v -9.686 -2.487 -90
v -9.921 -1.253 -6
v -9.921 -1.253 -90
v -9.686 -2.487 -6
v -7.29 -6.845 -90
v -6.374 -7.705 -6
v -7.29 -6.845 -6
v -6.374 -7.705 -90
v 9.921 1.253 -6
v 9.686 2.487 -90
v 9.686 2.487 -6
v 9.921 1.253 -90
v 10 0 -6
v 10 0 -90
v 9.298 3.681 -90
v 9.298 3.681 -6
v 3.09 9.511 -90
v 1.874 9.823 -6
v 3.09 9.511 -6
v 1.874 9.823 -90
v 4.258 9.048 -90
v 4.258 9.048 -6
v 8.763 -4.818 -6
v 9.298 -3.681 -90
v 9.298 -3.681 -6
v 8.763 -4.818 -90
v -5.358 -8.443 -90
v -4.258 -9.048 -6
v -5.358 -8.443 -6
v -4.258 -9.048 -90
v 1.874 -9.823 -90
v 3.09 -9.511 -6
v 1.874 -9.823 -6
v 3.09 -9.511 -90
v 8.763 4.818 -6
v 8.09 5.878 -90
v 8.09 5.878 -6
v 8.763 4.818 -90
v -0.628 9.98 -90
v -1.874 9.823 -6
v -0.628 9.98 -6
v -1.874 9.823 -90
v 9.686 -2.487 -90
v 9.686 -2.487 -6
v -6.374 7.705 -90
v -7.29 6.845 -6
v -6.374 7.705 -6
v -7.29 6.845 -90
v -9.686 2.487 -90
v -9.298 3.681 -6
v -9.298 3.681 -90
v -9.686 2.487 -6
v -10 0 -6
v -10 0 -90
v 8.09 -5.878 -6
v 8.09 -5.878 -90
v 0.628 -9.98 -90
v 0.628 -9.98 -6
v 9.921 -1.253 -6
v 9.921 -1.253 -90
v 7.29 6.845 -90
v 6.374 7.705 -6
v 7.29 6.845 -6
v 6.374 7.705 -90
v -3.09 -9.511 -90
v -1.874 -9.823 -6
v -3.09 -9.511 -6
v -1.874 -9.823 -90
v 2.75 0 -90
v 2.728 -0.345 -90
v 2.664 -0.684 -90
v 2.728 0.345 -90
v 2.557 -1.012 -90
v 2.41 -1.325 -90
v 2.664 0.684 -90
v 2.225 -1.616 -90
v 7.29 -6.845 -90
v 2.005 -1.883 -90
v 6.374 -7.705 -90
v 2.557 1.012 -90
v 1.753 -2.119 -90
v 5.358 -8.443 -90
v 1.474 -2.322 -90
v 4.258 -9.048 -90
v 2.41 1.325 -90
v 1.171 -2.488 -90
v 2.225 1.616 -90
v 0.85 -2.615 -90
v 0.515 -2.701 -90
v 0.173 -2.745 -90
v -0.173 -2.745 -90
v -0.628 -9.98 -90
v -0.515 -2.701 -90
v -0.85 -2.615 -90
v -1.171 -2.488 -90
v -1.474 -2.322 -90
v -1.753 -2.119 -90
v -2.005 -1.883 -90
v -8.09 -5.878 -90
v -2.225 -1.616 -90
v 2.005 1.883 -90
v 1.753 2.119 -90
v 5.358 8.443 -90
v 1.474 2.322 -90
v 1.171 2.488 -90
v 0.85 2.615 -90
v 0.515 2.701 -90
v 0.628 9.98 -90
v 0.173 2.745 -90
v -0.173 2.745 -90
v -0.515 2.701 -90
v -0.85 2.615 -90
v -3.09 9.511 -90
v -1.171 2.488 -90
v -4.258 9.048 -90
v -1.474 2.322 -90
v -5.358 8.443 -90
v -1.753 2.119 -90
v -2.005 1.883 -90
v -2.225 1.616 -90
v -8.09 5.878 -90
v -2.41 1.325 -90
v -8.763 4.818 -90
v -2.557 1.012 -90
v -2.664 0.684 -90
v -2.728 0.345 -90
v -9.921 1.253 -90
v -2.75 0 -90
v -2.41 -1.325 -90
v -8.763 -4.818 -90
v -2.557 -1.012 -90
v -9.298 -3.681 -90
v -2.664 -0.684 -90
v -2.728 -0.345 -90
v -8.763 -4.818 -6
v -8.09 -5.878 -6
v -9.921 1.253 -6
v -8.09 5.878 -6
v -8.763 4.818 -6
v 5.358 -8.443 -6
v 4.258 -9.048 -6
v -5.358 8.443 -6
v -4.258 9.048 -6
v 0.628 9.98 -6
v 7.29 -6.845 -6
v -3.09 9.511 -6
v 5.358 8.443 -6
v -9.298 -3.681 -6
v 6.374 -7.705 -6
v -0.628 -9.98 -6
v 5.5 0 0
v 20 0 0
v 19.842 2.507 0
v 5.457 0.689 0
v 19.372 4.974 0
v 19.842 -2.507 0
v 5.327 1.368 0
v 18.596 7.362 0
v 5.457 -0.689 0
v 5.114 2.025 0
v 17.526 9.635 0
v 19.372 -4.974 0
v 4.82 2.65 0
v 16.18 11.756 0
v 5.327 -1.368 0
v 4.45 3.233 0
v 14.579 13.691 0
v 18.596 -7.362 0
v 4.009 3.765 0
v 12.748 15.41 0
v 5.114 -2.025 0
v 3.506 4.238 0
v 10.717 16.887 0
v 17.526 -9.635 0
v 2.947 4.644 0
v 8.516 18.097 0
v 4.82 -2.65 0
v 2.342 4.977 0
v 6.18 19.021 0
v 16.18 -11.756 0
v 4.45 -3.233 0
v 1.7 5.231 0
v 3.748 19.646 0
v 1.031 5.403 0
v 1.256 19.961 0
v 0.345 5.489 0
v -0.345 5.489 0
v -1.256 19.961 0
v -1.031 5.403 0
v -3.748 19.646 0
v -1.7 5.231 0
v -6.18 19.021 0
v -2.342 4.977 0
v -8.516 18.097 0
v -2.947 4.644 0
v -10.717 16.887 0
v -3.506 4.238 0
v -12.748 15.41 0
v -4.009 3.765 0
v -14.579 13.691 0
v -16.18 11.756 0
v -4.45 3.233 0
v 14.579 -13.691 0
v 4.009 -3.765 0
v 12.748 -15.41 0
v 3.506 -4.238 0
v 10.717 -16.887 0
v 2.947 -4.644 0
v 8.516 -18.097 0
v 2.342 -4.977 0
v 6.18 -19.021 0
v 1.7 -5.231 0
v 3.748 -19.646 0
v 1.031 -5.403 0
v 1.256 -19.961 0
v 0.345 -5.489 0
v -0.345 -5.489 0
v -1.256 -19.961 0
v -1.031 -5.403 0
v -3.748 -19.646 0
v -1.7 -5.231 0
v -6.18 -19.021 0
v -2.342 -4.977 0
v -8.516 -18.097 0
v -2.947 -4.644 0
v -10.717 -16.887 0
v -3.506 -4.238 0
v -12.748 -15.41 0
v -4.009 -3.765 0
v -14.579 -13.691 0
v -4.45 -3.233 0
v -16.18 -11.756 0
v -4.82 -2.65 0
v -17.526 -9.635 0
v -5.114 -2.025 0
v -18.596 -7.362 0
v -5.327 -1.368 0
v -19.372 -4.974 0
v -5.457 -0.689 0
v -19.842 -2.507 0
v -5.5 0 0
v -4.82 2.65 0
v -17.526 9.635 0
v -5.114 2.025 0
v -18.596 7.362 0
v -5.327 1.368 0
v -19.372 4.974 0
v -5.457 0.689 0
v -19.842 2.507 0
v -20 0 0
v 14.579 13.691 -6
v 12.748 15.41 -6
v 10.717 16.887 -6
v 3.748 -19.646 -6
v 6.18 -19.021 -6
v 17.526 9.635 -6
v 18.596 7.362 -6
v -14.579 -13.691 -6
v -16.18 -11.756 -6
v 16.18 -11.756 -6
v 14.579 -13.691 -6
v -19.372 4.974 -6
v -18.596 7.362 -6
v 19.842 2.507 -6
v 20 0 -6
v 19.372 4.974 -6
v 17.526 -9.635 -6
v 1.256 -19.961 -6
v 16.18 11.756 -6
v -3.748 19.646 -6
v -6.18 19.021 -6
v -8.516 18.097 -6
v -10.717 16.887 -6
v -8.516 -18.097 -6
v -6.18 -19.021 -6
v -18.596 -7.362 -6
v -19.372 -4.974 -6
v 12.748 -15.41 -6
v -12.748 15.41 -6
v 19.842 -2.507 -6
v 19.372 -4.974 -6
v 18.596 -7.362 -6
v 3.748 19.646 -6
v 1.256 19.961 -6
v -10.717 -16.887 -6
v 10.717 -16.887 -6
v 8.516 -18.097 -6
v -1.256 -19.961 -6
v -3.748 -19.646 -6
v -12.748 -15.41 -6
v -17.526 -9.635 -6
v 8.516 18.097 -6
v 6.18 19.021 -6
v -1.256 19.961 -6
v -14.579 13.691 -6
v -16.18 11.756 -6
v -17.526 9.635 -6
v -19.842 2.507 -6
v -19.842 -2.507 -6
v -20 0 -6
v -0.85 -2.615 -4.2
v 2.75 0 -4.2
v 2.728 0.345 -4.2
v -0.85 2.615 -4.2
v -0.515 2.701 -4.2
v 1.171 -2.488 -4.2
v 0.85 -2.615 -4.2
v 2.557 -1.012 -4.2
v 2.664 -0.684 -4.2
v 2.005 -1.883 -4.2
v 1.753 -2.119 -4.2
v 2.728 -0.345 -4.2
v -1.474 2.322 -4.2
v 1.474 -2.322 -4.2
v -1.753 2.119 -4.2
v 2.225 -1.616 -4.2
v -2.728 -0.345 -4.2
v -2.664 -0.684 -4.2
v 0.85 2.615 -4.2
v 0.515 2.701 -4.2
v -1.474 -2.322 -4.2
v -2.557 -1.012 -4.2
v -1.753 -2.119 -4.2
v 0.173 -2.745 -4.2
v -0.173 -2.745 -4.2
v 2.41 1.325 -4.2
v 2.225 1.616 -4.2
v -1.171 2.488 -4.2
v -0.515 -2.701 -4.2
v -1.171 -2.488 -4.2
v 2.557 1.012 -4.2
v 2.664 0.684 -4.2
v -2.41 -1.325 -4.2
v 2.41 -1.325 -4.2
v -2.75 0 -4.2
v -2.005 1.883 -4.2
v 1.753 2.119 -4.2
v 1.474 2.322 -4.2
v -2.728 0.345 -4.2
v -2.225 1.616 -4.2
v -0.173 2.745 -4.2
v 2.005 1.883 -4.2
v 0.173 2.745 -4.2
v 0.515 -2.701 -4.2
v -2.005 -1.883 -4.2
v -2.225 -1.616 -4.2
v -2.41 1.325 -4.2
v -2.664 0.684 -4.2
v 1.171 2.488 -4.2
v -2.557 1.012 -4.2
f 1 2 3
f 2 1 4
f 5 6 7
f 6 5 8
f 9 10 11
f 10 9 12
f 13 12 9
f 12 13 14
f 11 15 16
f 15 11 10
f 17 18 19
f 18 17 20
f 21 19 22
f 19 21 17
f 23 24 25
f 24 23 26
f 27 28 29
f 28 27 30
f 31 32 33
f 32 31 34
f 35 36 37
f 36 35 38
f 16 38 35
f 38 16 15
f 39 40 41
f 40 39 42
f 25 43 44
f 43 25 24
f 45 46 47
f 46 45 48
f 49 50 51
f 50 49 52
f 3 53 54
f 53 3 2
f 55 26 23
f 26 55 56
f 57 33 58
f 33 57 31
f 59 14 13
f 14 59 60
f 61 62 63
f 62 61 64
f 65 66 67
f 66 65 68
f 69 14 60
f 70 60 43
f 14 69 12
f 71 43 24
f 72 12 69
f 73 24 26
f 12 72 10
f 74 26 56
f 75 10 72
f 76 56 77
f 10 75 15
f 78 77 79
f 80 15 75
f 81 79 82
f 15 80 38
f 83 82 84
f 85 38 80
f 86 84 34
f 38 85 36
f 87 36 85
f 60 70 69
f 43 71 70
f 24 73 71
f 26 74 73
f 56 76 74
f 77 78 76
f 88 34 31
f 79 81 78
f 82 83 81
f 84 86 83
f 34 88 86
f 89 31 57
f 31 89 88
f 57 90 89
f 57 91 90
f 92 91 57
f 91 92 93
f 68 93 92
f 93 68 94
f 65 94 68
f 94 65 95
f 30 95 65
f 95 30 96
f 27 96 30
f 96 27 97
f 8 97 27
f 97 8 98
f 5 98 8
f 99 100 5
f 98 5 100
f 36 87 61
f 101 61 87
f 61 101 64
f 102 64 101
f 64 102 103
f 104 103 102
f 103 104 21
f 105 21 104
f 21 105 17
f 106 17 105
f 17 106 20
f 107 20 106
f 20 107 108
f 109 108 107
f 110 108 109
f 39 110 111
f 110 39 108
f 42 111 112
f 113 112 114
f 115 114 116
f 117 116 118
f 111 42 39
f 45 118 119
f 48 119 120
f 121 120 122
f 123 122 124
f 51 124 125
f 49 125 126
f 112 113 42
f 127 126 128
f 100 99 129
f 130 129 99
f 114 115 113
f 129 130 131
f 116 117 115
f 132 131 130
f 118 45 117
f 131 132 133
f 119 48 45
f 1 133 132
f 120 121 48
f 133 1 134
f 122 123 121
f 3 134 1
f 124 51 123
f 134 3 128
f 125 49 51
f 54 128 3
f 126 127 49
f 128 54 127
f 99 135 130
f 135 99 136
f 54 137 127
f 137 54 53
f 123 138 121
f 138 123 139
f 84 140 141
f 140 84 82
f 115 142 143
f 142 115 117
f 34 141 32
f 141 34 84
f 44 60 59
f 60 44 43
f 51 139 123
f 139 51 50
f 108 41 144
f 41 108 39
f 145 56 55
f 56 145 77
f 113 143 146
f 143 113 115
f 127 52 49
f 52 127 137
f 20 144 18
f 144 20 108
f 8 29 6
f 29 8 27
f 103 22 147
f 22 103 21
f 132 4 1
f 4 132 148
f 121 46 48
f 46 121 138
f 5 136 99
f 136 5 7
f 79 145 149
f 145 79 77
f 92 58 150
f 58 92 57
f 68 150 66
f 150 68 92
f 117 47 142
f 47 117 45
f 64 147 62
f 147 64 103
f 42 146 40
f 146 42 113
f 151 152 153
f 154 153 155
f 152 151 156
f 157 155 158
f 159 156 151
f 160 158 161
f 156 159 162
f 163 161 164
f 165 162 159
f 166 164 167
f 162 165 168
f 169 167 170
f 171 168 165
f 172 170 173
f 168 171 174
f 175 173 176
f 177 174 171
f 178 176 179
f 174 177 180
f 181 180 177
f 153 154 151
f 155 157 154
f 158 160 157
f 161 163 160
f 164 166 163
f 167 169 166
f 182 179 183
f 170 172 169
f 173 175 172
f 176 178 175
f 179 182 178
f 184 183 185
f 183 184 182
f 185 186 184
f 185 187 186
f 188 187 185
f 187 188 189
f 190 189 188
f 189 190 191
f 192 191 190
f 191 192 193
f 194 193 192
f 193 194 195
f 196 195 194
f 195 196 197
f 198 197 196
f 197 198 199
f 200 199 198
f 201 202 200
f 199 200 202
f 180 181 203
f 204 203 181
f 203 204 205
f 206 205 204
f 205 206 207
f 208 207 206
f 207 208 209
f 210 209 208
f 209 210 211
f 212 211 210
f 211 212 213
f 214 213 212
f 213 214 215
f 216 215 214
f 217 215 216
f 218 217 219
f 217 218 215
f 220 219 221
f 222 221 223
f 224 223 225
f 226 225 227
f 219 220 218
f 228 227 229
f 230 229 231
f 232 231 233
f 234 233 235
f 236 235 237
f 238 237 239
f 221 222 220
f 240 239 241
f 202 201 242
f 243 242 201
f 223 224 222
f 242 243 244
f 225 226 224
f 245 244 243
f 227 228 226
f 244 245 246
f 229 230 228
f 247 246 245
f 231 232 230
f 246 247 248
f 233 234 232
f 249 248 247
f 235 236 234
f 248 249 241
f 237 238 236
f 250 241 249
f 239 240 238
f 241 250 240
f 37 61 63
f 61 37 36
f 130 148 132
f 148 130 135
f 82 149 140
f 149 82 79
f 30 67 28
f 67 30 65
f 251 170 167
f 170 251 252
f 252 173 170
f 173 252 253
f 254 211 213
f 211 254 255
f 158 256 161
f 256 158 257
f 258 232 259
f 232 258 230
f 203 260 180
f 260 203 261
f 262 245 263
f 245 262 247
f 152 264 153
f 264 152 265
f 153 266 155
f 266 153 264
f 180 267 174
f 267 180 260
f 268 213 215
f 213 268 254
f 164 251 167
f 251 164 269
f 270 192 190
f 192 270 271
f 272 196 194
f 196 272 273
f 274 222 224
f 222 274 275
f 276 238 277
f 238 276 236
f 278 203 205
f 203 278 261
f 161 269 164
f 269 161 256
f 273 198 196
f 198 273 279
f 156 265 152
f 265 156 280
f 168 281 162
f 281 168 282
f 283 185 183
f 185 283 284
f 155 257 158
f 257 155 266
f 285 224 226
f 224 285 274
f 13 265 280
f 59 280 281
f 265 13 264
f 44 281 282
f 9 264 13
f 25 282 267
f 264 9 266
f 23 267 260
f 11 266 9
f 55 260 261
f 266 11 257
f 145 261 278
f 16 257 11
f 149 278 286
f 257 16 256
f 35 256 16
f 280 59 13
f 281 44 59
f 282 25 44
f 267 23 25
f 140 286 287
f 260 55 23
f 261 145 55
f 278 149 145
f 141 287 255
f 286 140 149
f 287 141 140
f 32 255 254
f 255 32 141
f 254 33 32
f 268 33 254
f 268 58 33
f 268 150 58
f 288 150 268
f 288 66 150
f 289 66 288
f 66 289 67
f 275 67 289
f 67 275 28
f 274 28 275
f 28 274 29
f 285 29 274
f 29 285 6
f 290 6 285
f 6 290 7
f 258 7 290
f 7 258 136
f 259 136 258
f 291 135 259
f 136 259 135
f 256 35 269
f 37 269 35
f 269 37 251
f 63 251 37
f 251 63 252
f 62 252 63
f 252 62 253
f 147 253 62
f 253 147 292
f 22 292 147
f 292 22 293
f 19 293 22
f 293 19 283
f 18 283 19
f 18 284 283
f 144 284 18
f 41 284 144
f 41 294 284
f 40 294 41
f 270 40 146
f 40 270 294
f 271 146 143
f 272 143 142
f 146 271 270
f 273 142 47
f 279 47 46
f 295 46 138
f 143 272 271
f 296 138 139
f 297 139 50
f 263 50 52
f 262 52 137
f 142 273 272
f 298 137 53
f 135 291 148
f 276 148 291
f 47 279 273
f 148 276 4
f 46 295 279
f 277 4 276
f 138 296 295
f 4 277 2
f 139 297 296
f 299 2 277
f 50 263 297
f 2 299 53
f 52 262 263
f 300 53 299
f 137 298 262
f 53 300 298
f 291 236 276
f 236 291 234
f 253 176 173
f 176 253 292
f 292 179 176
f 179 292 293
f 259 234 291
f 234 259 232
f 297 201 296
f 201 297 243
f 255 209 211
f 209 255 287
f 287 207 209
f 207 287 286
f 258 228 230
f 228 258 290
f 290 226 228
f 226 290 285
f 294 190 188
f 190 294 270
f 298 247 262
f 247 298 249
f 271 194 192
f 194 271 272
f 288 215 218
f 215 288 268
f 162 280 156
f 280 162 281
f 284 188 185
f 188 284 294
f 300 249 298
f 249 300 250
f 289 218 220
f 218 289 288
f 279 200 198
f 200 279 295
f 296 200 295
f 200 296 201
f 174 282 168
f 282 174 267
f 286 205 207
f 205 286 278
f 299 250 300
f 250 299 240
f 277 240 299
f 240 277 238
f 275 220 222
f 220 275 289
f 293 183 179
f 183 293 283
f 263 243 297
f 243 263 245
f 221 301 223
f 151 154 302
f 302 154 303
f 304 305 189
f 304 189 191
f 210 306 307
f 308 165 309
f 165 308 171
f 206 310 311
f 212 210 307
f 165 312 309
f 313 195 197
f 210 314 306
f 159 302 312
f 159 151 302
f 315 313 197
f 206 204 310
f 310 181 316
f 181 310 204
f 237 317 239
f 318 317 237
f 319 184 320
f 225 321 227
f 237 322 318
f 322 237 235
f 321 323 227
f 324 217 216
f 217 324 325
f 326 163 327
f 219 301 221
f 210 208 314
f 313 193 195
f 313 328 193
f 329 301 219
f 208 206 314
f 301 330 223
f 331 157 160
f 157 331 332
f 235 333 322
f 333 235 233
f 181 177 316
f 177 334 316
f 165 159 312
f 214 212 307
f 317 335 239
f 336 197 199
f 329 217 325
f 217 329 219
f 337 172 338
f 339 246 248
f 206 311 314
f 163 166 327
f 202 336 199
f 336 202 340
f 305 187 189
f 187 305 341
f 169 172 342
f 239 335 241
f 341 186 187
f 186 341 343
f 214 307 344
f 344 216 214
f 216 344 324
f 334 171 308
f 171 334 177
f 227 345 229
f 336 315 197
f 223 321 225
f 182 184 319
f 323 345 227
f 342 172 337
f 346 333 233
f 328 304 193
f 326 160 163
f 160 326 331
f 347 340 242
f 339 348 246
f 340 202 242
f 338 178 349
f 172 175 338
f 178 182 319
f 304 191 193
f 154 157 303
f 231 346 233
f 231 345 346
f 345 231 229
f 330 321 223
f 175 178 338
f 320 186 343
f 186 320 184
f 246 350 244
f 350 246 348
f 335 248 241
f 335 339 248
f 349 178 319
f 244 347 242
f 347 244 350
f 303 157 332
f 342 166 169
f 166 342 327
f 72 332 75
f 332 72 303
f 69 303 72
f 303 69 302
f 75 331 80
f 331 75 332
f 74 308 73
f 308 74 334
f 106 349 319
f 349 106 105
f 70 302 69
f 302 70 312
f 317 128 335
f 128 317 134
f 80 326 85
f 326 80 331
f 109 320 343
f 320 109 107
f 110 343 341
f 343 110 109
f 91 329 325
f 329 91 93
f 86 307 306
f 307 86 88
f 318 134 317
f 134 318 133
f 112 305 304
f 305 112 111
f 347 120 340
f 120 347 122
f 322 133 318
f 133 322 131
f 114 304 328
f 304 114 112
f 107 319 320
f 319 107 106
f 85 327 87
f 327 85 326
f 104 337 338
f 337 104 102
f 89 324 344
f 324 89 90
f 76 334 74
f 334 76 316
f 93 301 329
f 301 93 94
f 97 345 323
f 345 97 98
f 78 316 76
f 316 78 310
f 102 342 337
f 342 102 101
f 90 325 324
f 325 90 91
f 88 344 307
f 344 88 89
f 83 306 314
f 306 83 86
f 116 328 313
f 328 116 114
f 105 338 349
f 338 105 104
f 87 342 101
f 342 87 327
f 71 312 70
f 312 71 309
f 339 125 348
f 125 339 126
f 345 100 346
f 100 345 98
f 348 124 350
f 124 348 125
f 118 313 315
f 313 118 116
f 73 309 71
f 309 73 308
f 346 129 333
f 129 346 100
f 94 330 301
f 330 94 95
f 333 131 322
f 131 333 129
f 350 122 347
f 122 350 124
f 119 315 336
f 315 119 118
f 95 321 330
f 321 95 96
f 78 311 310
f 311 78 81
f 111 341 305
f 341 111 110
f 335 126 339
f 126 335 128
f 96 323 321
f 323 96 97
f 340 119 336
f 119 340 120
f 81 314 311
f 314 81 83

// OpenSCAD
$fn = 50;


difference() {
	union() {
		translate(v = [0, 0, -90.0000000000]) {
			cylinder(h = 90, r = 10.0000000000);
		}
		translate(v = [0, 0, -6.0000000000]) {
			cylinder(h = 6, r = 20.0000000000);
		}
	}
	union() {
		translate(v = [0, 0, 0]) {
			rotate(a = [0, 0, 0]) {
				difference() {
					union() {
						#translate(v = [0, 0, -90.0000000000]) {
							cylinder(h = 90, r = 2.2500000000);
						}
						#translate(v = [0, 0, -4.2000000000]) {
							cylinder(h = 4.2000000000, r = 10.0000000000, r1 = 2.7500000000, r2 = 5.5000000000);
						}
						#translate(v = [0, 0, -90.0000000000]) {
							cylinder(h = 90, r = 2.7500000000);
						}
						#translate(v = [0, 0, -90.0000000000]) {
							cylinder(h = 90, r = 2.2500000000);
						}
					}
					union();
				}
			}
		}
	}
}
